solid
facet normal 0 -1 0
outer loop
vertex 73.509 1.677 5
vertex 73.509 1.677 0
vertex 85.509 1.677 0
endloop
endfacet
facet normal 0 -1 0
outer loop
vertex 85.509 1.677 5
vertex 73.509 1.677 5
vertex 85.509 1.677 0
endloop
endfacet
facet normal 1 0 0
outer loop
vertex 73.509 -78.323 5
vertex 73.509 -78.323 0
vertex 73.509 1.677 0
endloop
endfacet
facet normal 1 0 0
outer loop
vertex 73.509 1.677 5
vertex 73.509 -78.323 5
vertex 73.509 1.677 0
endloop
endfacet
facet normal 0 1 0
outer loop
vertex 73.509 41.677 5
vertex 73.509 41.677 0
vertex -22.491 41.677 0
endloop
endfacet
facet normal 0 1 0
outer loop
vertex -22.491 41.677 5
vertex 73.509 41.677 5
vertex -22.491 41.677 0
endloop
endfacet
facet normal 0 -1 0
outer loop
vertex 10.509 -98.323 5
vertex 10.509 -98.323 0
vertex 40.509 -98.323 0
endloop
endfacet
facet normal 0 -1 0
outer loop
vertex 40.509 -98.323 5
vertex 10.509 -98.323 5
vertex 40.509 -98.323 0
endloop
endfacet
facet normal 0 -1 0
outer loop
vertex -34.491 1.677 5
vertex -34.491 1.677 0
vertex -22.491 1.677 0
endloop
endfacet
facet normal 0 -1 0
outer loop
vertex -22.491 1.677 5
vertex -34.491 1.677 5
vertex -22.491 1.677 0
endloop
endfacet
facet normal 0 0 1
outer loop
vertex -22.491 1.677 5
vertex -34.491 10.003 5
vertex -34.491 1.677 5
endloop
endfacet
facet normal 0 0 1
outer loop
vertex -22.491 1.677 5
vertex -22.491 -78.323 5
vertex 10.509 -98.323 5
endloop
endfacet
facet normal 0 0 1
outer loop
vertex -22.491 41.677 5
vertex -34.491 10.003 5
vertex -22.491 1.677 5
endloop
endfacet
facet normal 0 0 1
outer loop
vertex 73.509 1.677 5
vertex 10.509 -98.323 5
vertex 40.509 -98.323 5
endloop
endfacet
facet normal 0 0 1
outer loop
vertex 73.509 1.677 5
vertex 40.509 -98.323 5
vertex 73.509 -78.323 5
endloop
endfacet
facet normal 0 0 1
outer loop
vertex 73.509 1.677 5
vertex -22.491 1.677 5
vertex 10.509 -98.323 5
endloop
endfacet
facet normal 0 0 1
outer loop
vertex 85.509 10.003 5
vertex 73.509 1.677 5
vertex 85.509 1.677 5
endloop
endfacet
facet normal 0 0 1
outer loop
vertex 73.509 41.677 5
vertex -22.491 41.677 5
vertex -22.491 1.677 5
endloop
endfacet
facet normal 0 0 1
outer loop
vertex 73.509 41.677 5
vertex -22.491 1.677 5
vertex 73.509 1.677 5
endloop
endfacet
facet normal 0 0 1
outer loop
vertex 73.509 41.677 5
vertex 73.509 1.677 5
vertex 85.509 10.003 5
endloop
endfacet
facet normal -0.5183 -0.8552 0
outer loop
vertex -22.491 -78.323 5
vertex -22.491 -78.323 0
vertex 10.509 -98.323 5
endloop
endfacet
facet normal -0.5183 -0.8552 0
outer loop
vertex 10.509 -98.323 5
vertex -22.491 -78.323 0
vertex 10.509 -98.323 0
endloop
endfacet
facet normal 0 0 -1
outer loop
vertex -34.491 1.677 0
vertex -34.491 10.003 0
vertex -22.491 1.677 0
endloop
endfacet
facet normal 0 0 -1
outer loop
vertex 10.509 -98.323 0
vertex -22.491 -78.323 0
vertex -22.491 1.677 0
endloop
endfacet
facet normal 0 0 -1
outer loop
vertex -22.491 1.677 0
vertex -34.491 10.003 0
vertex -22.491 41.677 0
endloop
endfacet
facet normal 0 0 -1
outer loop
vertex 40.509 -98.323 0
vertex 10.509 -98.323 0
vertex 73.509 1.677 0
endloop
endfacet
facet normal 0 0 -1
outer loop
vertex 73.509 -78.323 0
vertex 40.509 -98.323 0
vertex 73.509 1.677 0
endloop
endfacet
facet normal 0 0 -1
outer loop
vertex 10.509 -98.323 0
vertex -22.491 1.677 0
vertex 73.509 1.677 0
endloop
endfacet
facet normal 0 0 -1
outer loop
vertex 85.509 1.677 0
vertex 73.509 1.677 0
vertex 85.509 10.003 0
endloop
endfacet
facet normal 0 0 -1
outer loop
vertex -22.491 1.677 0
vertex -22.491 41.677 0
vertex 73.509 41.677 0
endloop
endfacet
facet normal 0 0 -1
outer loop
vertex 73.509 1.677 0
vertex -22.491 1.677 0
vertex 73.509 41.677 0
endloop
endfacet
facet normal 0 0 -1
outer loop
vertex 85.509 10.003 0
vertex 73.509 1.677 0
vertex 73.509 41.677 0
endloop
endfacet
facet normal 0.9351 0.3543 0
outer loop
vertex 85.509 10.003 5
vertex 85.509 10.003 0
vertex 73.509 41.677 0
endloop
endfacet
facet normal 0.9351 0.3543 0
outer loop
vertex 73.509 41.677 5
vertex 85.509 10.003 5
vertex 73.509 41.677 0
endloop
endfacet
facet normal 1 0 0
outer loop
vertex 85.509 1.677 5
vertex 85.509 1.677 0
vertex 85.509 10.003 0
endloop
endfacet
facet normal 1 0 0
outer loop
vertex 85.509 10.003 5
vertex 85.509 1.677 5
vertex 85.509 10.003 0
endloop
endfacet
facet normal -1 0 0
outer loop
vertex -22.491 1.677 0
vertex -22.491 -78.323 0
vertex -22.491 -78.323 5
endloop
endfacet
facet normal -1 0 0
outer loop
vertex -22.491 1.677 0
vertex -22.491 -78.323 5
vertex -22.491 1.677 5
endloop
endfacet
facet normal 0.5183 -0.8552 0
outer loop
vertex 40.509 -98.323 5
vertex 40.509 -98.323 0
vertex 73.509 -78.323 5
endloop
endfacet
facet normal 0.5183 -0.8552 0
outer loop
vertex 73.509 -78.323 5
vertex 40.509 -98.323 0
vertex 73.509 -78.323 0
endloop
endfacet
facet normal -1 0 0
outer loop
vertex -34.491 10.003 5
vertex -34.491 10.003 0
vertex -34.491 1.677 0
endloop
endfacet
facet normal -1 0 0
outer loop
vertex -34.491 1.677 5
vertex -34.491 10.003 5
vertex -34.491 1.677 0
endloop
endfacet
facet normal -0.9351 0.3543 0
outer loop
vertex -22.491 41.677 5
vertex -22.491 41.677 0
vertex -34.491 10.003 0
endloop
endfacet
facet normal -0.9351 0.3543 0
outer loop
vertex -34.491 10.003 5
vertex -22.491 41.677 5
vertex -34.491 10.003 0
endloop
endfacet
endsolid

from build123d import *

# Parameters (mm, degrees)
SKETCH1_W           = 48
SKETCH1_H           = 80
BOSS_EXTRUDE1_DEPTH = 5


with BuildPart() as part:
    # Sketch1 → Boss-Extrude1 (new body)
    with BuildSketch(Plane.XY):
        Polygon((25.508982036, 41.676646707), (-22.491017964, 41.676646707), (-34.491017964, 10.002955871), (-34.491017964, 1.676646707), (-22.491017964, 1.676646707), (25.508982036, 1.676646707), align=None)
        Polygon((73.508982036, 41.676646707), (25.508982036, 41.676646707), (25.508982036, 1.676646707), (73.508982036, 1.676646707), (85.508982036, 1.676646707), (85.508982036, 10.002955871), align=None)
        with Locations((1.508982036, -38.323353293)):
            Rectangle(SKETCH1_W, SKETCH1_H)
        with Locations((49.508982036, -38.323353293)):
            Rectangle(SKETCH1_W, SKETCH1_H)
        Polygon((25.508982036, -98.323353293), (25.508982036, -78.323353293), (-22.491017964, -78.323353293), (10.508982036, -98.323353293), align=None)
        Polygon((73.508982036, -78.323353293), (25.508982036, -78.323353293), (25.508982036, -98.323353293), (40.508982036, -98.323353293), align=None)
    extrude(amount=BOSS_EXTRUDE1_DEPTH)


solid = part.part
